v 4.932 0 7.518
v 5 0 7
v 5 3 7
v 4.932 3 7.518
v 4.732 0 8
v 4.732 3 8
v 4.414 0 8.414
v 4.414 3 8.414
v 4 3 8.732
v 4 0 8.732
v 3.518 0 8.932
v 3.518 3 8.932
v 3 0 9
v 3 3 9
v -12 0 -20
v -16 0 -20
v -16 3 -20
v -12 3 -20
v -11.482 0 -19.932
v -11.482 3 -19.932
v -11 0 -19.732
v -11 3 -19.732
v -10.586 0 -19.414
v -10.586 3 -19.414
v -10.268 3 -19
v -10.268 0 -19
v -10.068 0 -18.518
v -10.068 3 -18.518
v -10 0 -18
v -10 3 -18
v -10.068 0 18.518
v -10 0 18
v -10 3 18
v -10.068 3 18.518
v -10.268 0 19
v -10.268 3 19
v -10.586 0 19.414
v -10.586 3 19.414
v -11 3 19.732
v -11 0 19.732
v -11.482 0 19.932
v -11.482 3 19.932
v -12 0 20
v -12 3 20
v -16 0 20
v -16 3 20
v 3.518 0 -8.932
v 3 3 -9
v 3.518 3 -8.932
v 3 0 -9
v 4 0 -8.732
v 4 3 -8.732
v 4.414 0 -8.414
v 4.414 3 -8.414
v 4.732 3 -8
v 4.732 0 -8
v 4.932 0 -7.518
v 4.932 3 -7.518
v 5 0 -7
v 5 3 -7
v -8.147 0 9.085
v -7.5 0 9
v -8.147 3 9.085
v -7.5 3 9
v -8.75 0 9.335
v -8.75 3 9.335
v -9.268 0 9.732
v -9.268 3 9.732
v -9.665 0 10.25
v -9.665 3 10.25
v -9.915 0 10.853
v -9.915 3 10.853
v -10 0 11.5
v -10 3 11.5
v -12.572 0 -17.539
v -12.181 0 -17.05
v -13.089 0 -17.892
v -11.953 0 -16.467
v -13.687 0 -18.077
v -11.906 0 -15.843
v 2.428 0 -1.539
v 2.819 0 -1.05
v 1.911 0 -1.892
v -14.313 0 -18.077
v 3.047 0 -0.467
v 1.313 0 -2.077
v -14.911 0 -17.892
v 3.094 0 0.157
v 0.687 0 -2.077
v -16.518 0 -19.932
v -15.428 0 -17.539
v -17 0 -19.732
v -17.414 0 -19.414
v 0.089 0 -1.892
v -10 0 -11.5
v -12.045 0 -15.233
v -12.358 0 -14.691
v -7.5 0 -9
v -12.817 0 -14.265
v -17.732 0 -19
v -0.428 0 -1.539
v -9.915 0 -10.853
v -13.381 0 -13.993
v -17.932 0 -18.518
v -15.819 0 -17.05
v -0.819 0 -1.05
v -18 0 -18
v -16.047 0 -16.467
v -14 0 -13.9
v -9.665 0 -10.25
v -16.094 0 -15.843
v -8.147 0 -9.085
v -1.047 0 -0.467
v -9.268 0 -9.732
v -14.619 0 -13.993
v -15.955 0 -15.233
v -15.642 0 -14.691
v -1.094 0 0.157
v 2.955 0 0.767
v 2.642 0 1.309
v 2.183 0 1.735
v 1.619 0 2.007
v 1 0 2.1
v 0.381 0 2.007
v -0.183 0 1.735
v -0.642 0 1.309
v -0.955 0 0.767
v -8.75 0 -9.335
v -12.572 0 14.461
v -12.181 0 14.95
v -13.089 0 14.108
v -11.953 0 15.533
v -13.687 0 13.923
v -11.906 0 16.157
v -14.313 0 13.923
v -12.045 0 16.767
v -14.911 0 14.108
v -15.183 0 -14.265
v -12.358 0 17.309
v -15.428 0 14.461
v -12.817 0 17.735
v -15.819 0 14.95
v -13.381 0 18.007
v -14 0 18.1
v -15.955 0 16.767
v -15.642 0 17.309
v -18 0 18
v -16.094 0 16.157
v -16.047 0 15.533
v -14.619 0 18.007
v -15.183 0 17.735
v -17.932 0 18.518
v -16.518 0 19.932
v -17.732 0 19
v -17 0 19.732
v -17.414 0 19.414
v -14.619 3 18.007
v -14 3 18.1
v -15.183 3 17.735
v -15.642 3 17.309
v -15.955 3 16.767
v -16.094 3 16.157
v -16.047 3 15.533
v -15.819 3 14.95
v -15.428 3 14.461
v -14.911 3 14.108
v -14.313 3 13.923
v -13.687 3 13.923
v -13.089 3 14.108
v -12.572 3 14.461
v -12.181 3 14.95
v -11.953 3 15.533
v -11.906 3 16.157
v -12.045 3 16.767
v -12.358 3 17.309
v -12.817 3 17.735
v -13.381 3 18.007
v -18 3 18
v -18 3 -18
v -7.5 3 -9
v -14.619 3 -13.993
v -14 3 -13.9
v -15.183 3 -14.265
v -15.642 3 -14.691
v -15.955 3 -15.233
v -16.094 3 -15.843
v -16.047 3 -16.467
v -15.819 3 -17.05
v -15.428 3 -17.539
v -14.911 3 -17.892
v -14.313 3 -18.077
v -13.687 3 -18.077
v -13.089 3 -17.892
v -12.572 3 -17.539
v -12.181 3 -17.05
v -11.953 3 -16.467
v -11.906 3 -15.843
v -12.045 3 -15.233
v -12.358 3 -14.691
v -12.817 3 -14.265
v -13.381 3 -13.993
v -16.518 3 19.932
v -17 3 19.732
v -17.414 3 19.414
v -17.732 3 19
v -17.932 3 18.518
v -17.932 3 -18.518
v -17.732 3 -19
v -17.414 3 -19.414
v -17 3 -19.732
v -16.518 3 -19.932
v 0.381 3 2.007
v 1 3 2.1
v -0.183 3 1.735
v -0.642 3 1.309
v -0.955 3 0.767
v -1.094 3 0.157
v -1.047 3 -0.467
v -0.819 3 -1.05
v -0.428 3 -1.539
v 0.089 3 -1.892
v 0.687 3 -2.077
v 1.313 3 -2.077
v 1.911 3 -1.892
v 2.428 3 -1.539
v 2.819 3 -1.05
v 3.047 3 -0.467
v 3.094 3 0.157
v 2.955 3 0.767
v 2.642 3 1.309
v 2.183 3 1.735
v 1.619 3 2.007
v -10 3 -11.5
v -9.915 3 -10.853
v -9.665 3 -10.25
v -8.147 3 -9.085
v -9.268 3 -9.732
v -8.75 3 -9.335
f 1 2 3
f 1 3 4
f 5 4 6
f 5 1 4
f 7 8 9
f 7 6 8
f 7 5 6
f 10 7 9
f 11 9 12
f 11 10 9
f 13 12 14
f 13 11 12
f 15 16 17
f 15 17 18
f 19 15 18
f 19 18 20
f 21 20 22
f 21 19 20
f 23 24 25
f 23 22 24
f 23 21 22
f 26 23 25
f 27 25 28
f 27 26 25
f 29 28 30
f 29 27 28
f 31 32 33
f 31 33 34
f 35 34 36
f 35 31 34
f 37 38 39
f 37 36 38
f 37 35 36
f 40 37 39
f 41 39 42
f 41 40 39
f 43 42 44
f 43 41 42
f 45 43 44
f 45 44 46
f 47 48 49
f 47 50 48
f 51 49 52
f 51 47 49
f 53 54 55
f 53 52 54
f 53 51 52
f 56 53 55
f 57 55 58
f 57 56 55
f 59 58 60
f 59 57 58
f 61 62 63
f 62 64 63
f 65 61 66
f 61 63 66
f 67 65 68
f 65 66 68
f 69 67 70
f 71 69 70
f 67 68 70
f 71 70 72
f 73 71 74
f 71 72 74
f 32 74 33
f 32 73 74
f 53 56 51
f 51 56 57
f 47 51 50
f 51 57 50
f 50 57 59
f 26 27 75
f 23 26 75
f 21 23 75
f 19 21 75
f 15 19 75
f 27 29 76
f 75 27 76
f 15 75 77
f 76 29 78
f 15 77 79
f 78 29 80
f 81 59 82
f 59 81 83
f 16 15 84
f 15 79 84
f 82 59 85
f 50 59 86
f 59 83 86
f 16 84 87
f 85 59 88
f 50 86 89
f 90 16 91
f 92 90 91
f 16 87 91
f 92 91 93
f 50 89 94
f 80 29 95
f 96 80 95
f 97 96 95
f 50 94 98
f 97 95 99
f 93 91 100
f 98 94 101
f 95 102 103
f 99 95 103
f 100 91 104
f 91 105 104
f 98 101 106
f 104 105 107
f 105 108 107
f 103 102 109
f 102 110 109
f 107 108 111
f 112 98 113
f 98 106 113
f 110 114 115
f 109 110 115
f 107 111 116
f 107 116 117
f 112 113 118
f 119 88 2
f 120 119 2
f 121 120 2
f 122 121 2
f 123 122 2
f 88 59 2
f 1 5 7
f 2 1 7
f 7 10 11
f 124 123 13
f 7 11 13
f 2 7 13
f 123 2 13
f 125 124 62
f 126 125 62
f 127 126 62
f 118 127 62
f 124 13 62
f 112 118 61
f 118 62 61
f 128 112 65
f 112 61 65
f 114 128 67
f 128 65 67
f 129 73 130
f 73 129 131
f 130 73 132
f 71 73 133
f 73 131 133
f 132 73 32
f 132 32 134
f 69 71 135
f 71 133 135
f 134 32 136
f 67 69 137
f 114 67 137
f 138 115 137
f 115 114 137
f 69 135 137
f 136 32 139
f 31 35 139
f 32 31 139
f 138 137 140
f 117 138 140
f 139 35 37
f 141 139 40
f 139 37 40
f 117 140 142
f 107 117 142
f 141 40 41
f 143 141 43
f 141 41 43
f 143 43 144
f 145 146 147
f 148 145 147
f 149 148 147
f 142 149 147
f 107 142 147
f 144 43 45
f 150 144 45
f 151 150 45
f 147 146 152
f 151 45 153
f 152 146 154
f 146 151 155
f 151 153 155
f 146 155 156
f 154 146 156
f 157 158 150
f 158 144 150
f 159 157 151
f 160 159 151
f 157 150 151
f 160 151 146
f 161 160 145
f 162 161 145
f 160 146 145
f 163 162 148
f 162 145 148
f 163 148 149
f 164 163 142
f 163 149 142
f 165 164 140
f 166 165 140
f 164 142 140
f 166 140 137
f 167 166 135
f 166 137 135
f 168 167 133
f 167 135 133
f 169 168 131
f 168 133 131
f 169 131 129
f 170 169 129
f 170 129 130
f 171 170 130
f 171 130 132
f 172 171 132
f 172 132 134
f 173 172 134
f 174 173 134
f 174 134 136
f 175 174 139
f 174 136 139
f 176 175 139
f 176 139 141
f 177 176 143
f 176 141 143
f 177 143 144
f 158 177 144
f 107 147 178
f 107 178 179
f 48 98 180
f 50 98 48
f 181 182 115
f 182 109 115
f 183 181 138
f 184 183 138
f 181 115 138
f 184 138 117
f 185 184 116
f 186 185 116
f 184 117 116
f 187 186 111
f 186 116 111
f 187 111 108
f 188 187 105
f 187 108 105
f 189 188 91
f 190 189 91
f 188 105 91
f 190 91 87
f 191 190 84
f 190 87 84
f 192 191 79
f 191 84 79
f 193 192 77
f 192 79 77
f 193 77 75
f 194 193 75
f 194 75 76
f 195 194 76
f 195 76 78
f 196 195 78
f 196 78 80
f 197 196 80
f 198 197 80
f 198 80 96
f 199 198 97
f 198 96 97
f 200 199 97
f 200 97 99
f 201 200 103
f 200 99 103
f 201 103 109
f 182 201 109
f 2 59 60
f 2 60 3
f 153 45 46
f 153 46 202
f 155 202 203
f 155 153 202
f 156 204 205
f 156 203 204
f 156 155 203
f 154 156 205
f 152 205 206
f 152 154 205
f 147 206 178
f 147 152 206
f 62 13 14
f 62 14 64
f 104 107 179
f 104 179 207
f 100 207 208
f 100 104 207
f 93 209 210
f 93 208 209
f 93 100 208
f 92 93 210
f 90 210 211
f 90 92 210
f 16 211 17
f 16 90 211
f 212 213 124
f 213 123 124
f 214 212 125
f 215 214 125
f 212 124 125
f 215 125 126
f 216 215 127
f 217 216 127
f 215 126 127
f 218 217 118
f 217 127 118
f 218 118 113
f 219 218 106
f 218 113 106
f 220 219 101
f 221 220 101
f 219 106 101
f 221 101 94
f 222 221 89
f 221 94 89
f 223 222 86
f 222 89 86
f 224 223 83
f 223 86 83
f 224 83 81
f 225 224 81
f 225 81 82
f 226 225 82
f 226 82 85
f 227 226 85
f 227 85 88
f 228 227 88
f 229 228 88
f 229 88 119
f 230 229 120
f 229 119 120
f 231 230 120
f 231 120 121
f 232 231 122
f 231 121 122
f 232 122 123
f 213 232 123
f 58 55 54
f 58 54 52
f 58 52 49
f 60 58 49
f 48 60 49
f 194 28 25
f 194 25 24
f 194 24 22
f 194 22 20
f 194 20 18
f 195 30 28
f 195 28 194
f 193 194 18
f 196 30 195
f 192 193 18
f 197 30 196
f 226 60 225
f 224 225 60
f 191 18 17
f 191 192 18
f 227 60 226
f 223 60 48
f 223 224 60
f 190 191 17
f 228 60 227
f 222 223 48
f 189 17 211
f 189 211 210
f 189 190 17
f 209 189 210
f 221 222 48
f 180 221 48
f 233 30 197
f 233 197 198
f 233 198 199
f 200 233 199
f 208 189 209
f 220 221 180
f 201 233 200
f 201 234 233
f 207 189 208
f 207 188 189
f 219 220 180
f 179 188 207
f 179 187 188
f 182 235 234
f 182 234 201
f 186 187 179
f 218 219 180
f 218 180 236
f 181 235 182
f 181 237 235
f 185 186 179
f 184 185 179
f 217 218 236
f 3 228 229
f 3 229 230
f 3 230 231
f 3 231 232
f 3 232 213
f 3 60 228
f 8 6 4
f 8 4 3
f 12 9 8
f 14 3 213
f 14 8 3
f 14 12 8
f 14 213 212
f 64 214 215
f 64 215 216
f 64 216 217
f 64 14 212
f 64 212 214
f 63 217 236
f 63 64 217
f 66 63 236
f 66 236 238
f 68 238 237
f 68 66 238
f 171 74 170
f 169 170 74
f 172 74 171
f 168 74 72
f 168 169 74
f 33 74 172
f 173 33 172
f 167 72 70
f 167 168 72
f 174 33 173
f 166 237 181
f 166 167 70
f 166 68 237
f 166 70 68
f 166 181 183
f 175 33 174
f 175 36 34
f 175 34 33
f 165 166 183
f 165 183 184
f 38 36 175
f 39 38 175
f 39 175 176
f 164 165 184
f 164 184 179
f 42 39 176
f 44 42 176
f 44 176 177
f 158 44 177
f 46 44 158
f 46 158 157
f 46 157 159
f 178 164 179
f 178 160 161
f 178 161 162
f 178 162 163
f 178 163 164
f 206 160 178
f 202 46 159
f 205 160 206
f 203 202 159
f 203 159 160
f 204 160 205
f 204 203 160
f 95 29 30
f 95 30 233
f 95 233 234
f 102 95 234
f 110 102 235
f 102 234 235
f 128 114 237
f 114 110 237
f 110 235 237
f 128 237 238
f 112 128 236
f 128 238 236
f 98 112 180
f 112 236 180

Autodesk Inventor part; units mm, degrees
ref_plane "YZ Plane" through (0, 0, 0) normal (1, 0, 0) x (0, 1, 0)
ref_plane "XZ Plane" through (0, 0, 0) normal (0, 1, 0) x (-1, 0, 0)
ref_plane "XY Plane" through (0, 0, 0) normal (0, 0, 1) x (1, 0, 0)
sketch "スケッチ1" plane through (0, 0, 0) normal (0, 1, 0) x (-1, 0, 0)
  line L0 (-3, 9) -> (10, 9)
  line L1 (10, -9) -> (-3, -9)
  line L2 (-5, -7) -> (-5, 7)
  line L3 (12, 20) -> (16, 20)
  line L4 (18, 18) -> (18, -18)
  line L5 (16, -20) -> (12, -20)
  line L6 (10, -18) -> (10, -9)
  line L7 (10, 9) -> (10, 18)
  arc A0 (18, 18) -> (16, 20) centre (16, 18) ccw
  arc A1 (12, 20) -> (10, 18) centre (12, 18) ccw
  arc A2 (16, -20) -> (18, -18) centre (16, -18) ccw
  arc A3 (10, -18) -> (12, -20) centre (12, -18) ccw
  arc A4 (-5, -7) -> (-3, -9) centre (-3, -7) ccw
  arc A5 (-3, 9) -> (-5, 7) centre (-3, 7) ccw
  point P0 (0, 0)
  point P1 (-5, 9)
  point P2 (-5, -9)
  point P3 (10, 20)
  point P4 (18, -20)
  point P5 (18, 20)
  point P6 (10, -20)
  dimension "d0" = 5
  dimension "d2" = 8
  dimension "d3" = 8
  dimension "d4" = 18
  dimension "d5" = 9
  dimension "d6" = 40
  dimension "d7" = 20
  dimension "d8" = 10
  dimension "d10" = 2
extrude "プレート1" add sketch "スケッチ1" along normal blind 3
hole "穴1" at (-14, 3, 16) direction (0, -1, 0) diameter 4.2 end through all
hole "穴2" at (-14, 3, -16) direction (0, -1, 0) diameter 4.2 end through all
hole "穴3" at (1, 3, 0) direction (0, -1, 0) diameter 4.2 end through all
sketch "スケッチ2" plane through (0, 0, 0) normal (0, -1, 0) x (1, 0, 0)
  circle A0 centre (1, 0) radius 2.1 projected
  circle A1 centre (-14, -16) radius 2.1 projected
  circle A2 centre (-14, 16) radius 2.1 projected
  line L0 (-10, 9) -> (3, 9) projected
  line L1 (-10, 18) -> (-10, 9) projected
  arc A3 (-10, 18) -> (-12, 20) centre (-12, 18) ccw projected
  line L2 (-16, 20) -> (-12, 20) projected
  arc A4 (-16, 20) -> (-18, 18) centre (-16, 18) ccw projected
  line L3 (-18, -18) -> (-18, 18) projected
  arc A5 (-18, -18) -> (-16, -20) centre (-16, -18) ccw projected
  line L4 (-12, -20) -> (-16, -20) projected
  arc A6 (-12, -20) -> (-10, -18) centre (-12, -18) ccw projected
  line L5 (-10, -9) -> (-10, -18) projected
  line L6 (3, -9) -> (-10, -9) projected
  arc A7 (3, -9) -> (5, -7) centre (3, -7) ccw projected
  line L7 (5, 7) -> (5, -7) projected
  arc A8 (5, 7) -> (3, 9) centre (3, 7) ccw projected
  point P0 (0, 0)
fillet "フィレット1" radius 2.5 2 edges at (-10, 1.5, 9) (-10, 1.5, -9)
equation "\"d3\" = d2"
equation "\"d18\" = Thickness"
equation "\"d28\" = Thickness"
equation "\"d37\" = Thickness"
equation "\"d9\" = Thickness"
equation "\"d5\" = 0.5 * d4"
equation "\"d7\" = 0.5 * d6"
equation "\"BendRadius\" = Thickness"
equation "\"BendReliefWidth\" = Thickness"
equation "\"BendReliefDepth\" = 0.5 * Thickness"
equation "\"CornerReliefSize\" = 4 * Thickness"
equation "\"MinimumRemnant\" = 2 * Thickness"
equation "\"TransitionRadius\" = BendRadius"
equation "\"JacobiRadiusSize\" = BendRadius"
equation "\"GapSize\" = Thickness"
equation "\"Thickness\" = 3"
properties part number "T_almite_braket"
